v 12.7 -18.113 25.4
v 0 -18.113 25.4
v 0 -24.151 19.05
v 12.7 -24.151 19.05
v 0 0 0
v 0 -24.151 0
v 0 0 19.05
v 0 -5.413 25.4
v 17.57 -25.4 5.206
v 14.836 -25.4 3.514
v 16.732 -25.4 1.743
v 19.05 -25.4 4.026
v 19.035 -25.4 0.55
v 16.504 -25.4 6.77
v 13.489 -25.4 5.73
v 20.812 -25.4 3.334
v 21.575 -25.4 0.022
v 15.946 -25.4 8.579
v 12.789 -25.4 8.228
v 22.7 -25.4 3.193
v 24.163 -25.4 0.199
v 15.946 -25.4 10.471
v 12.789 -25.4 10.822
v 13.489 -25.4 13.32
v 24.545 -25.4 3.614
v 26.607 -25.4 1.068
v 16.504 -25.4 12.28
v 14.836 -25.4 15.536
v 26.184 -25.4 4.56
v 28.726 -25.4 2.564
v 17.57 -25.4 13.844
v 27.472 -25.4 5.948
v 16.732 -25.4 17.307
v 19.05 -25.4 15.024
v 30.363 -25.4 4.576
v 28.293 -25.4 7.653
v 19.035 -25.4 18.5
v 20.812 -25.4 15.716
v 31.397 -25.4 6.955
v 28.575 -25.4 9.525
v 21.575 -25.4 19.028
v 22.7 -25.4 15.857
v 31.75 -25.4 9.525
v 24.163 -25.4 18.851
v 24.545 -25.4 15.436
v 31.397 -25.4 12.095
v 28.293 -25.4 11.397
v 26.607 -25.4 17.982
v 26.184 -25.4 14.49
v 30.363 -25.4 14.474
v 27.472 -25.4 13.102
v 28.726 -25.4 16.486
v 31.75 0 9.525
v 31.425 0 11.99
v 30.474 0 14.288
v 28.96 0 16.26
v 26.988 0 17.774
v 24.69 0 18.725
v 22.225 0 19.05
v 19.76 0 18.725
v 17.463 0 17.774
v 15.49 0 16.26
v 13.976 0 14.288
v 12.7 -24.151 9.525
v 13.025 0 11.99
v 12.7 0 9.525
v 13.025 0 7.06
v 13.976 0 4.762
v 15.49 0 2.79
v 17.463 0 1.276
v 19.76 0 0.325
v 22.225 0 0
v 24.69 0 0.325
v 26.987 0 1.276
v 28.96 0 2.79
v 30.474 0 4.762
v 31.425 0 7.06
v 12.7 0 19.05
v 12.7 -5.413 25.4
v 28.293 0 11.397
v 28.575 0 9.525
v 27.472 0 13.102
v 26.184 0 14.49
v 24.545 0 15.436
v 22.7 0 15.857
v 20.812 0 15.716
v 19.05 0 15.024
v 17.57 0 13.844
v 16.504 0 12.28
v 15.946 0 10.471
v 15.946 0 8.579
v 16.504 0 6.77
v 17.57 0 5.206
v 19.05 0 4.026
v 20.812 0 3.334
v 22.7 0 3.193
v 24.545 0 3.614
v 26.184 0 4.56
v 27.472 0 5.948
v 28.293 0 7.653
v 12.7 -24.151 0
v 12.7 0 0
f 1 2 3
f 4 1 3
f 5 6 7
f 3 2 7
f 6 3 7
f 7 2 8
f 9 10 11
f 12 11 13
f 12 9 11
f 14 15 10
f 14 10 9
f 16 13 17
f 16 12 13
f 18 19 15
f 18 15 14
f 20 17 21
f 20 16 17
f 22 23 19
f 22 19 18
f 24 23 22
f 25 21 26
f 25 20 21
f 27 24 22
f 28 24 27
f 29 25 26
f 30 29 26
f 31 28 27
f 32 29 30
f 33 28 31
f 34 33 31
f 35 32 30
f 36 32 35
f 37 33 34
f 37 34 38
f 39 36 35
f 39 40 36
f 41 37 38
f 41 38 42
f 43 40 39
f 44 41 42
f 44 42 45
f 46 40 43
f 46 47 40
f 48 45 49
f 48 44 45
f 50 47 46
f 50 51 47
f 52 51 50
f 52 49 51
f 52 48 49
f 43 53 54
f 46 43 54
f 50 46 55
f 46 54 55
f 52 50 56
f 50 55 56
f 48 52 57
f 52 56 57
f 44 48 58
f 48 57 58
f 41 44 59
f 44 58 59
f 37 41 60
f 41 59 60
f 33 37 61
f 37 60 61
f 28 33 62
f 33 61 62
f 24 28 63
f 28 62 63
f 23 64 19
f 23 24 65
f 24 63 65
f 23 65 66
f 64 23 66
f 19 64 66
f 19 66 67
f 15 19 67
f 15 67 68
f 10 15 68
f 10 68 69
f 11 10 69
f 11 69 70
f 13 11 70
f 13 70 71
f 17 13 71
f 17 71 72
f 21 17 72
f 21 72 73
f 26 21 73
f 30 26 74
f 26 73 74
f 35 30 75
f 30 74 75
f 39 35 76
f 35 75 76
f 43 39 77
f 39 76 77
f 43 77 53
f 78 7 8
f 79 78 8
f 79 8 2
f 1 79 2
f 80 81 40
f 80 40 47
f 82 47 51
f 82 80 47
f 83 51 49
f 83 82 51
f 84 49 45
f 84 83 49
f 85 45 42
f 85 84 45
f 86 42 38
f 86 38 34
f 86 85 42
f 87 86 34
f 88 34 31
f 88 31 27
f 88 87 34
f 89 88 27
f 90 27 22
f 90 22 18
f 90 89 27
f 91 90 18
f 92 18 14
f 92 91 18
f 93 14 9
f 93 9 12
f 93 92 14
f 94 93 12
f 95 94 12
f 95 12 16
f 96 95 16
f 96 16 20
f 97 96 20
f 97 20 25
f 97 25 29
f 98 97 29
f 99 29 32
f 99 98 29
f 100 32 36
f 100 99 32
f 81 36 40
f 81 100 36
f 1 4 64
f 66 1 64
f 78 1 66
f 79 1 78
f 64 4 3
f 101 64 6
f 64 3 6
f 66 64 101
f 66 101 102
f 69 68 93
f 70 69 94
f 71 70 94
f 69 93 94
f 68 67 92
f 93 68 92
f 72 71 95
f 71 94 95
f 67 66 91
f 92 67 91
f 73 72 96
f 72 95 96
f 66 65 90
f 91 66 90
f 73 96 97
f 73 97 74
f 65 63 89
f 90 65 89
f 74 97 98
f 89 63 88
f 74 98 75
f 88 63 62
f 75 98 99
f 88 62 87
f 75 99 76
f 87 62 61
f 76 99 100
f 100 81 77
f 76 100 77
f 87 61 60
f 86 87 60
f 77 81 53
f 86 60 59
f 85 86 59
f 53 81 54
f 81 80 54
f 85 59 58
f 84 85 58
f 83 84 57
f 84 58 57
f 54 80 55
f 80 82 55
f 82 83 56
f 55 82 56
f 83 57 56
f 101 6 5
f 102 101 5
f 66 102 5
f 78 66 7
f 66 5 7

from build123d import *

# Parameters (mm, degrees)
F1_DEPTH = 12.7
F2_R     = 9.525
F2_R_2   = 6.35
F3_DEPTH = 25.4


with BuildPart() as f1:
    # F0 (on Right) → F1 (new body)
    with BuildSketch(Plane.YZ):
        Polygon((-24.150821, 0), (0, 0), (0, 19.05), (-5.413115, 25.4), (-18.113115, 25.4), (-24.150821, 19.05), align=None)
    extrude(amount=F1_DEPTH)

    # F2 (on Front) → F3 (join)
    with BuildSketch(Plane.XZ):
        with Locations((22.225, 9.525)):
            Circle(F2_R)
        with Locations((22.225, 9.525)):
            Circle(F2_R_2, mode=Mode.SUBTRACT)
    extrude(amount=F3_DEPTH)


solid = f1.part
